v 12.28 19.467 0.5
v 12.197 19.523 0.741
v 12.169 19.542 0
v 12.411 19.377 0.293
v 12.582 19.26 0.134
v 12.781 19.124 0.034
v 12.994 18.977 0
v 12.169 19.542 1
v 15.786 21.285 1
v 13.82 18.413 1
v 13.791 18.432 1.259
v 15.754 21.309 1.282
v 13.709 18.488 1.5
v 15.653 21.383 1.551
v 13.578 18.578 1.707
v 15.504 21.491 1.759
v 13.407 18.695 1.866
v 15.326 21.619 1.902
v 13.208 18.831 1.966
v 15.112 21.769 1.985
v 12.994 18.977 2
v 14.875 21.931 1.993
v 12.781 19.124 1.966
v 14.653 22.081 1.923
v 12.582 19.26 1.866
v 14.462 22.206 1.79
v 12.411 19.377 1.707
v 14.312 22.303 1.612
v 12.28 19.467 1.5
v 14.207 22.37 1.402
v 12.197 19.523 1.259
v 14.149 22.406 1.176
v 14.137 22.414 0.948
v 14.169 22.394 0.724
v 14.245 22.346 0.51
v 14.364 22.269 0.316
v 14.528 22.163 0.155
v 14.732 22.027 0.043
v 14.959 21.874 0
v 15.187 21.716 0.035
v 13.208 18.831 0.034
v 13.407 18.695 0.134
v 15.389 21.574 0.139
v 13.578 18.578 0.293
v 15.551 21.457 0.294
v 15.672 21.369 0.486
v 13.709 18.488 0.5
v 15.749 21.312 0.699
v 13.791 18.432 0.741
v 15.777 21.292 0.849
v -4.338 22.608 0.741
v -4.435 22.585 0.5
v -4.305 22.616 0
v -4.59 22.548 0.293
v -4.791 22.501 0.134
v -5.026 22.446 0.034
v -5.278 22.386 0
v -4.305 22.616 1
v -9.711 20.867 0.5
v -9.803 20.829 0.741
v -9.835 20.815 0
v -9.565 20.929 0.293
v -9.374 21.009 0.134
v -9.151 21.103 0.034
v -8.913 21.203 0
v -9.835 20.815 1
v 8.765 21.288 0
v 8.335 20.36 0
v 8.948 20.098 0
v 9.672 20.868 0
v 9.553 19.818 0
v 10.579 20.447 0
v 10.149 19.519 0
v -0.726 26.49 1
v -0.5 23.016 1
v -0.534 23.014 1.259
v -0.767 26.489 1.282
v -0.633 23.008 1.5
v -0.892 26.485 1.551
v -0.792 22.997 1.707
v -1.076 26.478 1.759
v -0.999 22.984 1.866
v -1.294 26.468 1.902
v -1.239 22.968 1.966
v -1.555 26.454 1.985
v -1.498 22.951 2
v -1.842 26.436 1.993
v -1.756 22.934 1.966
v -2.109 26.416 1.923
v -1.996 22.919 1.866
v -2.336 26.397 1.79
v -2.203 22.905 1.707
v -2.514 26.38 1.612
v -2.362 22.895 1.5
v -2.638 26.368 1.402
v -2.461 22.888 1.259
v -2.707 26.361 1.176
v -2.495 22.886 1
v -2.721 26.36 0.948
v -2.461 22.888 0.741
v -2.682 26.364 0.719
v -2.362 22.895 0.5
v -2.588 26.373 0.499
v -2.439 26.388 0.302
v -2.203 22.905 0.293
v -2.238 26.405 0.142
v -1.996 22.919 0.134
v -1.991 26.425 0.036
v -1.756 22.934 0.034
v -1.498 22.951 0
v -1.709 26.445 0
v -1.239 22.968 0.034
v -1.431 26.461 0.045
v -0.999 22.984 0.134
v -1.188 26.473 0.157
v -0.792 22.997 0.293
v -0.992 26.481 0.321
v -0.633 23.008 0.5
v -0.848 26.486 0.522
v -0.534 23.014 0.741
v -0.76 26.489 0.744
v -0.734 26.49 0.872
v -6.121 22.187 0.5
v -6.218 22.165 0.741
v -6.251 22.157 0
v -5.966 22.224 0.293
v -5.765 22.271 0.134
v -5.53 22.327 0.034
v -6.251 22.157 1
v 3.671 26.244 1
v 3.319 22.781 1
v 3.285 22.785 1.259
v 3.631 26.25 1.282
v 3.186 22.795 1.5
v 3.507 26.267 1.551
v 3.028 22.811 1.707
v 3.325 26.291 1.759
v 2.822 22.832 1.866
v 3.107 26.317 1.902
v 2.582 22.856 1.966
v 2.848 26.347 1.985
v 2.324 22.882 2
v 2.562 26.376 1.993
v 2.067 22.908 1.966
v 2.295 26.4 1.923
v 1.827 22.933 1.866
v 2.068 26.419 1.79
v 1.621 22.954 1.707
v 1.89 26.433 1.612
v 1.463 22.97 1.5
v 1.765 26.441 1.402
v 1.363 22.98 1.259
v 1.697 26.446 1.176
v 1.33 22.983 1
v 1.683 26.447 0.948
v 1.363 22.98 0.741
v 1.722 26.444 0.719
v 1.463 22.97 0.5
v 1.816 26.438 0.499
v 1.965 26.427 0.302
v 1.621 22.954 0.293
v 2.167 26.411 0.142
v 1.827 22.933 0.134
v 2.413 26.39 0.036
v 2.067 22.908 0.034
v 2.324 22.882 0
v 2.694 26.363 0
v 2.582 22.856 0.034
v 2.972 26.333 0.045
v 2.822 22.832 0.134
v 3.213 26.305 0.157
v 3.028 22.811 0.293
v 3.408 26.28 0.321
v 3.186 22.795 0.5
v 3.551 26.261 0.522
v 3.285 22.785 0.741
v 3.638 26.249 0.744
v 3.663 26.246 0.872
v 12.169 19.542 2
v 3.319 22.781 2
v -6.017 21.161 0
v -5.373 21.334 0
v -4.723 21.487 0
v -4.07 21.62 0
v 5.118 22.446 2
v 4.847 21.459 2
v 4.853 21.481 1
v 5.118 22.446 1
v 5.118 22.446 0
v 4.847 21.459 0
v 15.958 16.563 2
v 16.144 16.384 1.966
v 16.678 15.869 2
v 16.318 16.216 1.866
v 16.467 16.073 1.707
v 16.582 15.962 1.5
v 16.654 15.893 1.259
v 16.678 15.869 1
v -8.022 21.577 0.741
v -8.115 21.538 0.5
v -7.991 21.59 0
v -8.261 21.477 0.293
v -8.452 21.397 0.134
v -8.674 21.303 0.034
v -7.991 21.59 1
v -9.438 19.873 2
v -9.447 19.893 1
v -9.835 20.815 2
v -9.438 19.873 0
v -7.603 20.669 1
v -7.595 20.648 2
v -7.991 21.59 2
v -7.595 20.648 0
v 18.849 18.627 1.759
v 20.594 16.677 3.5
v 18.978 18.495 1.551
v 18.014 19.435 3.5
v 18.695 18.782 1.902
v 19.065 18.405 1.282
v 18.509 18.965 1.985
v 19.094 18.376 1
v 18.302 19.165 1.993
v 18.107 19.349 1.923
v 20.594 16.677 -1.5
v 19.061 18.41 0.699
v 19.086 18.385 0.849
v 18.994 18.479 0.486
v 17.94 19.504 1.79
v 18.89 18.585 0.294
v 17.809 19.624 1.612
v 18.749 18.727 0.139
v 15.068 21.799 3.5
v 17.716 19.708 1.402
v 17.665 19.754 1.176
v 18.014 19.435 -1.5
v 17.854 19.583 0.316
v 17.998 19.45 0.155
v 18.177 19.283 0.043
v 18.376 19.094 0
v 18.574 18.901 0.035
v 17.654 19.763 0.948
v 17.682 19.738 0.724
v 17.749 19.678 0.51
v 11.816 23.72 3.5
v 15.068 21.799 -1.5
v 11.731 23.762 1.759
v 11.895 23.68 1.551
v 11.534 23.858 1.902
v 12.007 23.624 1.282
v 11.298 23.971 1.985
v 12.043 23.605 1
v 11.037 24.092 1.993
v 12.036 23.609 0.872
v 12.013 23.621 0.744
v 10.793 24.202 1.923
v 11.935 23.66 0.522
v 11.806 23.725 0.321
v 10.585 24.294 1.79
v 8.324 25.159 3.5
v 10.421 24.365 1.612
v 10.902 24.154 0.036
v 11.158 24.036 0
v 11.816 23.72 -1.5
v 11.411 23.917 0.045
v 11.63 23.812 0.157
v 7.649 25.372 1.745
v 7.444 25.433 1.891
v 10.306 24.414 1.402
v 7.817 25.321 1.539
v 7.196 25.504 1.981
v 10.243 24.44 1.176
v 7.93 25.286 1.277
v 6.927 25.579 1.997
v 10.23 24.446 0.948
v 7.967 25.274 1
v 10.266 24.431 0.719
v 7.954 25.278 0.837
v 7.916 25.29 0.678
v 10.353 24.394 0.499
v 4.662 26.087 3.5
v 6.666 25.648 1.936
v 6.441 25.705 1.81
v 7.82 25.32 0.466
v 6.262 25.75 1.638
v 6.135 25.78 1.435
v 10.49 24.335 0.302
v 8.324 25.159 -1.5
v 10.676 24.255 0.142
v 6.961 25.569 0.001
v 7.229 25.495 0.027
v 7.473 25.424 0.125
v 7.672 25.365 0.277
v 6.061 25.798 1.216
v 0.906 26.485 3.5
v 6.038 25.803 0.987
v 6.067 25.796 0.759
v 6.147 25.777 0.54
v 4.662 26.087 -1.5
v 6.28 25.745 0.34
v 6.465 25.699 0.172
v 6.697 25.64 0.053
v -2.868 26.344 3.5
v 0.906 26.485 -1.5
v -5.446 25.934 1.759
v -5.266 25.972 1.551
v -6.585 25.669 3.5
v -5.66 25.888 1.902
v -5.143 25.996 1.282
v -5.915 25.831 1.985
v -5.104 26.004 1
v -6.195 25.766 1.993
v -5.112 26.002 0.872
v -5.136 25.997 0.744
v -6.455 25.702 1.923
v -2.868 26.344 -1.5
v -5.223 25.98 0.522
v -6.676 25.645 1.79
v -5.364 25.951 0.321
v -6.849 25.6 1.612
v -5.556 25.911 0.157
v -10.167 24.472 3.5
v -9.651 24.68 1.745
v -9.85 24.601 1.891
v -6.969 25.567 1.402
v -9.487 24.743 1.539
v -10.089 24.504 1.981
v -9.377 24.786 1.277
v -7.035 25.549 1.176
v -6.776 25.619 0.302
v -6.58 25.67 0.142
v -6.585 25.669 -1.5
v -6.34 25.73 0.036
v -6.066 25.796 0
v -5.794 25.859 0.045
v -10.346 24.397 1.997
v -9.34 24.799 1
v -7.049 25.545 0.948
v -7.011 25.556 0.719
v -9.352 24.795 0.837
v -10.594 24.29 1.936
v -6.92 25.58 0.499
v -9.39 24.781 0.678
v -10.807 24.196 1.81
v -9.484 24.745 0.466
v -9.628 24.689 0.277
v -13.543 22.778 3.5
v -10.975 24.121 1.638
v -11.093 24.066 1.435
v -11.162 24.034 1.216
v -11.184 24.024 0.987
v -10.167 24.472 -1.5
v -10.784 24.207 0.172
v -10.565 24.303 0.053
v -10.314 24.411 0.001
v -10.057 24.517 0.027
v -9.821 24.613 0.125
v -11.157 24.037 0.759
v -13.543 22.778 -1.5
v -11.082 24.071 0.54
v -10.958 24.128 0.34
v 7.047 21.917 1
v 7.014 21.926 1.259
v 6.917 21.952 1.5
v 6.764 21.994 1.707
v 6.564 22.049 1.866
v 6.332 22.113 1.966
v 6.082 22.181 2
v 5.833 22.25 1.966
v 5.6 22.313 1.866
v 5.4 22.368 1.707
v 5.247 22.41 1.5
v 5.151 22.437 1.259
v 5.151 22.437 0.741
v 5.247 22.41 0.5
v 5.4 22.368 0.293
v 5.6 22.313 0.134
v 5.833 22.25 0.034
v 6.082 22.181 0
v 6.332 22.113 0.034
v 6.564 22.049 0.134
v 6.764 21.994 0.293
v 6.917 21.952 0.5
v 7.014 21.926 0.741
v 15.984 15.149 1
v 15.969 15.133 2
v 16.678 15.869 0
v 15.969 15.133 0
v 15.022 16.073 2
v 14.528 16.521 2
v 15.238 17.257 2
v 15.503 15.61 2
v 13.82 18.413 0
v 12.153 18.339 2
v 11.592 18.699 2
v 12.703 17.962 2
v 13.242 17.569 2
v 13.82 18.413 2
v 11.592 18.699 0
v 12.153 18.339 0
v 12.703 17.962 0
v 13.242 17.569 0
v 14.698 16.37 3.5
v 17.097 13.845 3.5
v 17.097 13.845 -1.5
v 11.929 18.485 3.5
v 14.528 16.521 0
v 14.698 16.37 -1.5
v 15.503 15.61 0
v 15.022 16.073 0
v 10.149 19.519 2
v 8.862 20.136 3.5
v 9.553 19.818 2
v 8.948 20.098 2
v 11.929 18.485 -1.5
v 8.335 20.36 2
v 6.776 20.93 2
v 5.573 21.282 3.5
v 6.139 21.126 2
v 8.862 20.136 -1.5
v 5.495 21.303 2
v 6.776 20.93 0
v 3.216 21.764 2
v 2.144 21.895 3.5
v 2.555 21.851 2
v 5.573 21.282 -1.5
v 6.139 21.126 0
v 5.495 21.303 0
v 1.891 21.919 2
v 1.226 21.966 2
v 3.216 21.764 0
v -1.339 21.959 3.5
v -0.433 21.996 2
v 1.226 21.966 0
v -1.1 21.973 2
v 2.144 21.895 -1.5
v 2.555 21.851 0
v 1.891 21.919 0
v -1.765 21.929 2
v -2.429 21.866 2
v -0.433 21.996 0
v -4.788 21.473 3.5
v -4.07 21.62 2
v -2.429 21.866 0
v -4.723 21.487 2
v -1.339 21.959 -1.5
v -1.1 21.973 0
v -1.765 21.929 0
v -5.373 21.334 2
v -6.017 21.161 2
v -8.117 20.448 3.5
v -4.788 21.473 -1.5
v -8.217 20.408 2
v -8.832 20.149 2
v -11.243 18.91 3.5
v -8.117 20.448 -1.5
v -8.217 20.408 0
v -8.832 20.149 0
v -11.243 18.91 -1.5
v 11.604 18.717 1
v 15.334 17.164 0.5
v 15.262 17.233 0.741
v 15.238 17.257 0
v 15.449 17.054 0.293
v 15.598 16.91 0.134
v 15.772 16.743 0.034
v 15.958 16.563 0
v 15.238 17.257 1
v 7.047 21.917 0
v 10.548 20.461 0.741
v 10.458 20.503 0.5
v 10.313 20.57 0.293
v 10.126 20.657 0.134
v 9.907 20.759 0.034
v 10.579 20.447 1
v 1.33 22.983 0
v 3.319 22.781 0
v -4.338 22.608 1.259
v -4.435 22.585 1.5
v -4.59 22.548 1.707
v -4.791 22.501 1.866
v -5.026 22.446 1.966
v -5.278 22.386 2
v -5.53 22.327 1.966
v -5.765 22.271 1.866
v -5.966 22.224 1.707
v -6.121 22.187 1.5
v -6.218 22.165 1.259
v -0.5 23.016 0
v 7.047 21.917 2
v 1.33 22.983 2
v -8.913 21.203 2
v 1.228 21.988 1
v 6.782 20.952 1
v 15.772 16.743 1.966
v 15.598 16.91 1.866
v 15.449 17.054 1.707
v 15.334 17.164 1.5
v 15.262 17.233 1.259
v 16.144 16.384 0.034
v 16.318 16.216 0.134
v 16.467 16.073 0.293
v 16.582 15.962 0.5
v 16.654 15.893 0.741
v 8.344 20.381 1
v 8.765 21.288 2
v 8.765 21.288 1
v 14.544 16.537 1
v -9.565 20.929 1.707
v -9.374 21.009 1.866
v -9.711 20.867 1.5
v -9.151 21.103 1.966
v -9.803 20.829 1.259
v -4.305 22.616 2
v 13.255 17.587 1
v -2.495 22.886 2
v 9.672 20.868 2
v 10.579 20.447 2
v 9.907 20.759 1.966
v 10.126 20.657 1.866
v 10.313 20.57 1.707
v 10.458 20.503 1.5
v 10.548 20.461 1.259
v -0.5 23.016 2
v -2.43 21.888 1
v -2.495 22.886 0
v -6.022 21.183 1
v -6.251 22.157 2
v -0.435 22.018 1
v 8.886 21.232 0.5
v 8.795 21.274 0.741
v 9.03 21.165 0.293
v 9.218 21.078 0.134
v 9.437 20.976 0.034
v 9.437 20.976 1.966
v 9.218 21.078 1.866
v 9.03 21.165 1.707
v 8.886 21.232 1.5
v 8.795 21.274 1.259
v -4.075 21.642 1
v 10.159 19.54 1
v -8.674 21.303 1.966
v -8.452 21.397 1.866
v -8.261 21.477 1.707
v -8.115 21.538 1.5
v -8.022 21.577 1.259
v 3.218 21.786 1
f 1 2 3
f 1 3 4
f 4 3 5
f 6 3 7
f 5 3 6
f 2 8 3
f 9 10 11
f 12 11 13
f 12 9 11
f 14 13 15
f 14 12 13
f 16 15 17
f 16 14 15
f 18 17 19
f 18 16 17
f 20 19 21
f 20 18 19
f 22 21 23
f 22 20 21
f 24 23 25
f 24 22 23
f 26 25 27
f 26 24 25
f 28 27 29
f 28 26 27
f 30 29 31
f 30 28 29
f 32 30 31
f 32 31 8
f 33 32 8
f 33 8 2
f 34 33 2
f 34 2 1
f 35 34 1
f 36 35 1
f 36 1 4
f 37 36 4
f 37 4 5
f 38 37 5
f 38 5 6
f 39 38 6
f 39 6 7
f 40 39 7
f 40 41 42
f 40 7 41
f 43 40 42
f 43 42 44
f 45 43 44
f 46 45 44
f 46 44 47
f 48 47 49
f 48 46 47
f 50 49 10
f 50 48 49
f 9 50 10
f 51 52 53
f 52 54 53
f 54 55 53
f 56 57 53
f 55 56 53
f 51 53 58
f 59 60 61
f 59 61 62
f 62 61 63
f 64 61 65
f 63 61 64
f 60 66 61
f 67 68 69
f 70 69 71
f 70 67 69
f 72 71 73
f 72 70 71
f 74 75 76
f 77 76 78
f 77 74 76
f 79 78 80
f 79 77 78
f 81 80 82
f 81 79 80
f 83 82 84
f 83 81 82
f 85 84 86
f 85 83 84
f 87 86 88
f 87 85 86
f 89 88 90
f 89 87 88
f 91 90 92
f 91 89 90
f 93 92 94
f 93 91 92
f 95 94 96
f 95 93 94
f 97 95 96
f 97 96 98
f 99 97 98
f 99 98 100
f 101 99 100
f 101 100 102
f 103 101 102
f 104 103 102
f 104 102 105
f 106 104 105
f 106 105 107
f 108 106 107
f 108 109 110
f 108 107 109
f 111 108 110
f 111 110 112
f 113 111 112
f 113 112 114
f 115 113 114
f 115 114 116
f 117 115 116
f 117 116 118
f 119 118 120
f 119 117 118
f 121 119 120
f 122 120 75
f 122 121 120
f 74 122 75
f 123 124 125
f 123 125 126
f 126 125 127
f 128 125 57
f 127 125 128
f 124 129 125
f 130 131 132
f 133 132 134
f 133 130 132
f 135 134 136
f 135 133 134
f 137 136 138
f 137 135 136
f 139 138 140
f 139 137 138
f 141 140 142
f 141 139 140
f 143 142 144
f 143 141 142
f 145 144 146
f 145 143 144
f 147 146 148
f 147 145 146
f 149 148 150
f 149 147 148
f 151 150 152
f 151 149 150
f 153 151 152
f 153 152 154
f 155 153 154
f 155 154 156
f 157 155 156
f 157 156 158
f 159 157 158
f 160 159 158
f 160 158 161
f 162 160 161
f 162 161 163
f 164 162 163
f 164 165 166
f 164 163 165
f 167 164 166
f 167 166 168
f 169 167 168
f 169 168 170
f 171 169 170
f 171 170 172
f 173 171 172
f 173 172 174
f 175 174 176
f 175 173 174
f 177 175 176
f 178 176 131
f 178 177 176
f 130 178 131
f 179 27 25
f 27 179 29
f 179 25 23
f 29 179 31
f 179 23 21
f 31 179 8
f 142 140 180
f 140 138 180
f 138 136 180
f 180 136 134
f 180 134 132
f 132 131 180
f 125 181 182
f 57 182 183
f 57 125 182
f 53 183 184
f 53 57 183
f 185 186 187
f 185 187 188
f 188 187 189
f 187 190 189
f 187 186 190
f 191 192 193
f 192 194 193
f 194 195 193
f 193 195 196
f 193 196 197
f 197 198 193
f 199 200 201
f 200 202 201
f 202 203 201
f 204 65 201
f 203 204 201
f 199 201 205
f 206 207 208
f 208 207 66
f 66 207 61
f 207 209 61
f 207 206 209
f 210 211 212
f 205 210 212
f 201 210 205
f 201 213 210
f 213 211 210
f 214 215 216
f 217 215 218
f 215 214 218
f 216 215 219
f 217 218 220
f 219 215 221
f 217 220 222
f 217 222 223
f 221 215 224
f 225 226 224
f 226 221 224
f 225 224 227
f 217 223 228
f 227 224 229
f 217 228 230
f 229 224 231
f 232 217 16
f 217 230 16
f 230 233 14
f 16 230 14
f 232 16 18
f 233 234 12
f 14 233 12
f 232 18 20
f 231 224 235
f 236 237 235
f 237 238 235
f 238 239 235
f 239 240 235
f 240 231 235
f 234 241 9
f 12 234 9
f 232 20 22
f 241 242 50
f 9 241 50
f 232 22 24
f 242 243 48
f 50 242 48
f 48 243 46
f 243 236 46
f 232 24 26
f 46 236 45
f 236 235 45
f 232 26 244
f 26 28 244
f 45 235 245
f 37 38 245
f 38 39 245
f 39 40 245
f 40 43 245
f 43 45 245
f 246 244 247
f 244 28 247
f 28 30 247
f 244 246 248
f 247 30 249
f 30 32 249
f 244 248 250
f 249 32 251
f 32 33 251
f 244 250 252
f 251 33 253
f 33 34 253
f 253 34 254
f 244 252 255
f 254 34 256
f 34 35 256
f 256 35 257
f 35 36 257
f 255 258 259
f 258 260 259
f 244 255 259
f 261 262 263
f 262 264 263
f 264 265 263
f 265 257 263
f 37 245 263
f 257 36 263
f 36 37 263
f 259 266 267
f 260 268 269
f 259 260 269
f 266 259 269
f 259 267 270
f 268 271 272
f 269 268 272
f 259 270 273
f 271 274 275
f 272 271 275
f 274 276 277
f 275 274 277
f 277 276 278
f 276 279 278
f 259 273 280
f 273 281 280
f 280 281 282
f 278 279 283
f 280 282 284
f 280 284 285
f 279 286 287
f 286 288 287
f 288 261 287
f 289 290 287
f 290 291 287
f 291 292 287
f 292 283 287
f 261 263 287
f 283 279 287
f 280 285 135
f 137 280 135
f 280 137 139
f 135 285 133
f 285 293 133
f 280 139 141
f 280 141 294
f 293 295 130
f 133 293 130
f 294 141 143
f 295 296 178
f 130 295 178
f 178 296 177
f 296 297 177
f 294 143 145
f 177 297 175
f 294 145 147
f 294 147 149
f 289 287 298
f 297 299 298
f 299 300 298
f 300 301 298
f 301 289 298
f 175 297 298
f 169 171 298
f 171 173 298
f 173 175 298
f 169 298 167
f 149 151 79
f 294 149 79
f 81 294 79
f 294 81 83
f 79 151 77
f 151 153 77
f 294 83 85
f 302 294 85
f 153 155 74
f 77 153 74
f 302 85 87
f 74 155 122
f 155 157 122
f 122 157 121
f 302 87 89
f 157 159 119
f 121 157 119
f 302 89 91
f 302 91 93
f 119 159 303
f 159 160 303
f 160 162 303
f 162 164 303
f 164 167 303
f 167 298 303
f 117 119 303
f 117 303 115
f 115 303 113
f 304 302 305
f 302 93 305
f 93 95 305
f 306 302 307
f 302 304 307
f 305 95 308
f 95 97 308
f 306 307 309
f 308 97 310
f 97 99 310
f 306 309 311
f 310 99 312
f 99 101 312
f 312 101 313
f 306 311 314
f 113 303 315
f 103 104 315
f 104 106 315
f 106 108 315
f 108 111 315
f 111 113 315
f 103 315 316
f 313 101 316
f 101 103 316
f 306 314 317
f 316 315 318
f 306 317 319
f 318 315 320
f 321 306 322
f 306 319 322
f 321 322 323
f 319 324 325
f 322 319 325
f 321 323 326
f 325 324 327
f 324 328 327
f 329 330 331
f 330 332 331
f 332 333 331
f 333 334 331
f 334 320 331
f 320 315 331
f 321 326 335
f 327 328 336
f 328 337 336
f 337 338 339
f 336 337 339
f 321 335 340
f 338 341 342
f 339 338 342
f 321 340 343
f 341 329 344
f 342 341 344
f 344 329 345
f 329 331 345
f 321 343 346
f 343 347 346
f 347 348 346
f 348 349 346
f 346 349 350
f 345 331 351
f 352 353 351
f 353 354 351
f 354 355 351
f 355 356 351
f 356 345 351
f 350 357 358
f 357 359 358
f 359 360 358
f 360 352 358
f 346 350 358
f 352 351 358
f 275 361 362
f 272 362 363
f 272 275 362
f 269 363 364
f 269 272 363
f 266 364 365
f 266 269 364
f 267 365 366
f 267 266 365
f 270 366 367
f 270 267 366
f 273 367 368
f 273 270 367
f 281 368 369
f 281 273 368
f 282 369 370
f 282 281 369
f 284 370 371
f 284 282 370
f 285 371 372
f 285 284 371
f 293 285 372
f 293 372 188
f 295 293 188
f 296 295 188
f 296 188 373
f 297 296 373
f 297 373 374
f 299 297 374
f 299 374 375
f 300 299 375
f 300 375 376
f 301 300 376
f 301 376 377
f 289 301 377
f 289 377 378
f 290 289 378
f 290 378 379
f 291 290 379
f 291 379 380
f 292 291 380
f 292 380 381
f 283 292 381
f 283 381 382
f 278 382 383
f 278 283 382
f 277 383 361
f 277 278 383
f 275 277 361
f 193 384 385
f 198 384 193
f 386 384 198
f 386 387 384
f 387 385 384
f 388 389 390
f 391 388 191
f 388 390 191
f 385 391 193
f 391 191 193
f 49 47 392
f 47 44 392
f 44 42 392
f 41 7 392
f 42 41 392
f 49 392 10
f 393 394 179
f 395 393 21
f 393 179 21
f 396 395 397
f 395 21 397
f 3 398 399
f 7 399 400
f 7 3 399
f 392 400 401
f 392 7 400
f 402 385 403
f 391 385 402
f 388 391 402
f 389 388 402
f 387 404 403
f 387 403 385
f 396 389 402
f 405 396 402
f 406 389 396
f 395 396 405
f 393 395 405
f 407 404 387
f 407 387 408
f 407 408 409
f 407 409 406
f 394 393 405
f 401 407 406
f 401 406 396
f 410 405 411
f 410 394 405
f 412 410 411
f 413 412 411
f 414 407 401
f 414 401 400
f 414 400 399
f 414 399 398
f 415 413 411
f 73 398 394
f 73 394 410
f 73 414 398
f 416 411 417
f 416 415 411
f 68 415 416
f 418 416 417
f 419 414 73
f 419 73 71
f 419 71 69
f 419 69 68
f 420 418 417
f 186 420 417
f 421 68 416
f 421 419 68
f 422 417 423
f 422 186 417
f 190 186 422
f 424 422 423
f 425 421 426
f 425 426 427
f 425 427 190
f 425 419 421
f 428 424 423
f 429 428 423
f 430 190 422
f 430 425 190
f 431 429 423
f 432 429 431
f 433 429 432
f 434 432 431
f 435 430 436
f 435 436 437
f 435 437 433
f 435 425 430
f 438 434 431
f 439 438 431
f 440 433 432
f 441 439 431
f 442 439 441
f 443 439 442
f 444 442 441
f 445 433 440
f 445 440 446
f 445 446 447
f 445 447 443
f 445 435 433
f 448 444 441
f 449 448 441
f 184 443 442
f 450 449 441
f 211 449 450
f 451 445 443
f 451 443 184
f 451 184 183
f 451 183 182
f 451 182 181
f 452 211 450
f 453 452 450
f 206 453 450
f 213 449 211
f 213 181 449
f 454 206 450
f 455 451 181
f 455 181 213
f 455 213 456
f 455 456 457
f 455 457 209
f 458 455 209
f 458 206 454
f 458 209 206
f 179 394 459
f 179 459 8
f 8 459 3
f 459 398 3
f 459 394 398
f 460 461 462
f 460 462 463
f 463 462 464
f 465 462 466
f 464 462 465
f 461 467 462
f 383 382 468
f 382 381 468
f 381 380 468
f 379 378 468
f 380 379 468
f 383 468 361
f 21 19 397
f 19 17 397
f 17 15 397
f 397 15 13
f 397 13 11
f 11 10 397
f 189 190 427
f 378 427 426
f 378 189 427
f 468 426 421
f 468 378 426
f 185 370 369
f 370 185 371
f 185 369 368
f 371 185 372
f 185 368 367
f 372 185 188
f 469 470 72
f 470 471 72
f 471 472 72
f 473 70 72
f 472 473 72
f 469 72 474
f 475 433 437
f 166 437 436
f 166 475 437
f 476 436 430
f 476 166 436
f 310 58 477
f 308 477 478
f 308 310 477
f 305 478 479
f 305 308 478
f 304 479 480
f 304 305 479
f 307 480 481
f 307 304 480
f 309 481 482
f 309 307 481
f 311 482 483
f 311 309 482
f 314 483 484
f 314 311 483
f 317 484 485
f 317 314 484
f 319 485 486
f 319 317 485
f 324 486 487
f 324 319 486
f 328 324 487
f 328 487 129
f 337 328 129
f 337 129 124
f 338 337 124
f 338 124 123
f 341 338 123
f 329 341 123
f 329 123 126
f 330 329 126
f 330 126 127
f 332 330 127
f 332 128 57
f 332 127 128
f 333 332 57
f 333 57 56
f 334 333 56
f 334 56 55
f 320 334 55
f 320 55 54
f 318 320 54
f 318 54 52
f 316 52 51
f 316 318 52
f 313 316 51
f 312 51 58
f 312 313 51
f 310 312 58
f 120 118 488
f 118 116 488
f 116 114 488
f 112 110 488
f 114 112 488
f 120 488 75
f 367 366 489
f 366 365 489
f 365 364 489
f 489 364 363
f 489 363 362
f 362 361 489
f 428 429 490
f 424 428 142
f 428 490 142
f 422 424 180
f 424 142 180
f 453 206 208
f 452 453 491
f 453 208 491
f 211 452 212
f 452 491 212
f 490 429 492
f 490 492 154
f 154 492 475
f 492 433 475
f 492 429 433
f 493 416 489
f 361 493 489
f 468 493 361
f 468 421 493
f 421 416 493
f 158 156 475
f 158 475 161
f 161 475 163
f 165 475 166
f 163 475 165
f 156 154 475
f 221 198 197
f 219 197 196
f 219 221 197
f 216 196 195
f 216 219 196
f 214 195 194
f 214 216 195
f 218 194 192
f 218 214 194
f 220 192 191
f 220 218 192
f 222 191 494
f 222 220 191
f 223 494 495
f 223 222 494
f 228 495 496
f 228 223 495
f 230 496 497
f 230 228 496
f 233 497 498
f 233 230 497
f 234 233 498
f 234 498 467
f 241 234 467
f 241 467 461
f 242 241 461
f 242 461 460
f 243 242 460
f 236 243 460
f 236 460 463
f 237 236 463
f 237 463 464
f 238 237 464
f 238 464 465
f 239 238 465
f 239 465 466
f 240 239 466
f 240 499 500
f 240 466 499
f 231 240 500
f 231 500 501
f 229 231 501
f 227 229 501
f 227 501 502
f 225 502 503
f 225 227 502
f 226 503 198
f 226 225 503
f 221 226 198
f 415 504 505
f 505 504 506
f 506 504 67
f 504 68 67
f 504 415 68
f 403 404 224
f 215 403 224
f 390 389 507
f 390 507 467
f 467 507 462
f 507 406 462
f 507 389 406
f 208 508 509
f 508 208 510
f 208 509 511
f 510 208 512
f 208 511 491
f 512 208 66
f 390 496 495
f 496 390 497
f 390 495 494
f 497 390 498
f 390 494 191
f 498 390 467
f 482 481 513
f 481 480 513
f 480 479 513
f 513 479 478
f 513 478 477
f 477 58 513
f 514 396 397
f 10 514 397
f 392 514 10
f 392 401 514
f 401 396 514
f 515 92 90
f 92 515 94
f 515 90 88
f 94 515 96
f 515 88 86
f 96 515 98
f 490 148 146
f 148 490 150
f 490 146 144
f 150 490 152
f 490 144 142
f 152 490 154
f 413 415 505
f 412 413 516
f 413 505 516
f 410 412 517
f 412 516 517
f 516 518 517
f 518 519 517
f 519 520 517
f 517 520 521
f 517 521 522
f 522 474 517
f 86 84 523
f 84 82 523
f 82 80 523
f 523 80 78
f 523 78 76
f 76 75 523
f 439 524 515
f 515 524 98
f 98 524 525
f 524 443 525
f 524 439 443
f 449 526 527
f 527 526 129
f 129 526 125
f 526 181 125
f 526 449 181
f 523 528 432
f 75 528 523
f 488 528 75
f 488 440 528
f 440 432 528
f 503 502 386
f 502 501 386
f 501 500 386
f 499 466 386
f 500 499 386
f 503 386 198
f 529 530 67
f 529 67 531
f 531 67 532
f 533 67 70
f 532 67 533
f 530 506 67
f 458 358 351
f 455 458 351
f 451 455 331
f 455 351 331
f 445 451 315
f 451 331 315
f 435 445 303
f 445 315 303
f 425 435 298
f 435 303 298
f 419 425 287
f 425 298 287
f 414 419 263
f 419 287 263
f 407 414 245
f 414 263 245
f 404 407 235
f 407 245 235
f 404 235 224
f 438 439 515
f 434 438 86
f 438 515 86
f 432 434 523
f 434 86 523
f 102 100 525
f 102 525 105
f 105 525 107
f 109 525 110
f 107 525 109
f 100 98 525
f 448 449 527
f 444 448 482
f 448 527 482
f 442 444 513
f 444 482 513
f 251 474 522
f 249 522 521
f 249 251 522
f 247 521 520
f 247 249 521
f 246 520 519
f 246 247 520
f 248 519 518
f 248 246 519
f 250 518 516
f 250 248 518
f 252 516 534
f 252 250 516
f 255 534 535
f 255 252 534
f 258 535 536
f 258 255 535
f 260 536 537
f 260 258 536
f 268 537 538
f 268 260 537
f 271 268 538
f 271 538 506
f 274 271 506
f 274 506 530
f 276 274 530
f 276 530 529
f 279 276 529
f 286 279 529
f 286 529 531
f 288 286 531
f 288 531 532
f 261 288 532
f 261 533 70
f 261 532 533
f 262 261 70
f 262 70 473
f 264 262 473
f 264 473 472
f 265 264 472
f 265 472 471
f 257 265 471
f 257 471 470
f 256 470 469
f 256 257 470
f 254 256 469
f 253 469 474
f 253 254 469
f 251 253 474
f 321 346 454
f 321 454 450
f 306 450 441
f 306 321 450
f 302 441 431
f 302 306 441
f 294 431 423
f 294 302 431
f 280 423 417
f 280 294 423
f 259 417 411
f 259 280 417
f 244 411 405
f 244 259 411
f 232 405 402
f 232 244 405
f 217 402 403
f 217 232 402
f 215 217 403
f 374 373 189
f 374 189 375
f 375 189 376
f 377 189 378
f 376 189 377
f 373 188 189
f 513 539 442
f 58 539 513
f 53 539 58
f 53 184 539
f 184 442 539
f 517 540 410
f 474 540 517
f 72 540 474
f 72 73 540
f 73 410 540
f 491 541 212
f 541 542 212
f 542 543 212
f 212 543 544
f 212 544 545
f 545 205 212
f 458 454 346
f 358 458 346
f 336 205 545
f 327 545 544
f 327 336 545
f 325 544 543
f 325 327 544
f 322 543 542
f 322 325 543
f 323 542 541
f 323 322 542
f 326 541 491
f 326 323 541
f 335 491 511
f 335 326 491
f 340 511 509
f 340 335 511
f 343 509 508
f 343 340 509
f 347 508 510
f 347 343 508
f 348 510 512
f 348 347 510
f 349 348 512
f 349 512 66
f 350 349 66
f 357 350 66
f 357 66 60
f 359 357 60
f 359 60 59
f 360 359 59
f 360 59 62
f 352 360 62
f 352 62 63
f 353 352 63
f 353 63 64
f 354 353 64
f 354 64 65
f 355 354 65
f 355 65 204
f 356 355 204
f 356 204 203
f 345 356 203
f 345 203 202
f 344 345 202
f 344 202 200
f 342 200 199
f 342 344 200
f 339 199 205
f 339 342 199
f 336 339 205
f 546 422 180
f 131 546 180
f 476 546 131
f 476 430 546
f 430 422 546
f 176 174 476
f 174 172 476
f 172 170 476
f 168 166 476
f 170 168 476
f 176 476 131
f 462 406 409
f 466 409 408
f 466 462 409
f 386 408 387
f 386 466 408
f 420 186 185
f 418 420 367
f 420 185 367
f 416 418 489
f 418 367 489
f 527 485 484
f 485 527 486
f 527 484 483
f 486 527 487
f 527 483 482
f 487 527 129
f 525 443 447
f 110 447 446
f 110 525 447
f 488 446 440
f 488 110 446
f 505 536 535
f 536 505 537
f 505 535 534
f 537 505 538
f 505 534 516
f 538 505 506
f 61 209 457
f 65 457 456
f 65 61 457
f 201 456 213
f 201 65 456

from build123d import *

# Parameters (mm, degrees)
BOX_W                       = 2
BOX_H                       = 2
BOX_DEPTH                   = 2
CYLINDER_R                  = 1
CYLINDER_DEPTH              = 7
ARRAY_COUNT                 = 8
ARRAY_ANGLE                 = -66.734026
ARRAY_PLACEMENT_ANGLE       = 22.8
TUBE001_R                   = 26.5
TUBE001_R_2                 = 22
TUBE001_DEPTH               = 5
CYLINDER003_W               = 27
CYLINDER003_H               = 10
CYLINDER003_ANGLE           = 81.734026
CYLINDER003_PLACEMENT_ANGLE = 43
COMMON001_PLACEMENT_ANGLE   = 4


with BuildPart() as cube:
    # Box → Box (new body)
    with BuildSketch(Plane(origin=(-1, 21, 0), x_dir=(1, 0, 0), z_dir=(0, 0, 1))):
        with Locations((1, 1)):
            Rectangle(BOX_W, BOX_H)
    extrude(amount=BOX_DEPTH)


with BuildPart() as bodyside_contacts:
    # Cylinder → Cylinder (new body)
    with BuildSketch(Plane(origin=(0, 29, 1), x_dir=(1, 0, 0), z_dir=(0, -1, 0))):
        Circle(CYLINDER_R)
    extrude(amount=CYLINDER_DEPTH)

    # Fusion: union Cube
    add(cube.part)

    # Array: BodySide_Contacts ×8 about axis
    array_axis = Axis((0, 0, 0), (0, 0, 1))


with BuildPart() as bodyside_contacts_1:
    add(bodyside_contacts.part)
    for i in range(1, ARRAY_COUNT):
        add(bodyside_contacts.part.rotate(array_axis, i * ARRAY_ANGLE / (ARRAY_COUNT - 1)))


with BuildPart() as bodyside_contacts_2:
    # Array placement: moved
    add(bodyside_contacts_1.part.rotate(Axis((0, 0, 0), (0, 0, 1)), ARRAY_PLACEMENT_ANGLE))


with BuildPart() as tube001:
    # Tube001 → Tube001 (new body)
    with BuildSketch(Plane.XY.offset(-1.5)):
        Circle(TUBE001_R)
        Circle(TUBE001_R_2, mode=Mode.SUBTRACT)
    extrude(amount=TUBE001_DEPTH)


with BuildPart() as cut001:
    # Cylinder003 → Cylinder003 (revolve)
    with BuildSketch(Plane.XZ):
        with Locations((13.5, 5)):
            Rectangle(CYLINDER003_W, CYLINDER003_H)
    revolve(axis=Axis((0, 0, 0), (0, 0, 1)), revolution_arc=CYLINDER003_ANGLE)


with BuildPart() as cut001_1:
    # Cylinder003 placement: moved
    add(cut001.part.moved(Location((0, 0, -3))).rotate(Axis((0, 0, -3), (0, 0, 1)), CYLINDER003_PLACEMENT_ANGLE))

    # Common001: intersect Tube001
    add(tube001.part, mode=Mode.INTERSECT)


with BuildPart() as cut001_2:
    # Common001 placement: moved
    add(cut001_1.part.rotate(Axis((0, 0, 0), (0, 0, -1)), COMMON001_PLACEMENT_ANGLE))

    # Cut001: cut BodySide_Contacts
    add(bodyside_contacts_2.part, mode=Mode.SUBTRACT)


solid = cut001_2.part
